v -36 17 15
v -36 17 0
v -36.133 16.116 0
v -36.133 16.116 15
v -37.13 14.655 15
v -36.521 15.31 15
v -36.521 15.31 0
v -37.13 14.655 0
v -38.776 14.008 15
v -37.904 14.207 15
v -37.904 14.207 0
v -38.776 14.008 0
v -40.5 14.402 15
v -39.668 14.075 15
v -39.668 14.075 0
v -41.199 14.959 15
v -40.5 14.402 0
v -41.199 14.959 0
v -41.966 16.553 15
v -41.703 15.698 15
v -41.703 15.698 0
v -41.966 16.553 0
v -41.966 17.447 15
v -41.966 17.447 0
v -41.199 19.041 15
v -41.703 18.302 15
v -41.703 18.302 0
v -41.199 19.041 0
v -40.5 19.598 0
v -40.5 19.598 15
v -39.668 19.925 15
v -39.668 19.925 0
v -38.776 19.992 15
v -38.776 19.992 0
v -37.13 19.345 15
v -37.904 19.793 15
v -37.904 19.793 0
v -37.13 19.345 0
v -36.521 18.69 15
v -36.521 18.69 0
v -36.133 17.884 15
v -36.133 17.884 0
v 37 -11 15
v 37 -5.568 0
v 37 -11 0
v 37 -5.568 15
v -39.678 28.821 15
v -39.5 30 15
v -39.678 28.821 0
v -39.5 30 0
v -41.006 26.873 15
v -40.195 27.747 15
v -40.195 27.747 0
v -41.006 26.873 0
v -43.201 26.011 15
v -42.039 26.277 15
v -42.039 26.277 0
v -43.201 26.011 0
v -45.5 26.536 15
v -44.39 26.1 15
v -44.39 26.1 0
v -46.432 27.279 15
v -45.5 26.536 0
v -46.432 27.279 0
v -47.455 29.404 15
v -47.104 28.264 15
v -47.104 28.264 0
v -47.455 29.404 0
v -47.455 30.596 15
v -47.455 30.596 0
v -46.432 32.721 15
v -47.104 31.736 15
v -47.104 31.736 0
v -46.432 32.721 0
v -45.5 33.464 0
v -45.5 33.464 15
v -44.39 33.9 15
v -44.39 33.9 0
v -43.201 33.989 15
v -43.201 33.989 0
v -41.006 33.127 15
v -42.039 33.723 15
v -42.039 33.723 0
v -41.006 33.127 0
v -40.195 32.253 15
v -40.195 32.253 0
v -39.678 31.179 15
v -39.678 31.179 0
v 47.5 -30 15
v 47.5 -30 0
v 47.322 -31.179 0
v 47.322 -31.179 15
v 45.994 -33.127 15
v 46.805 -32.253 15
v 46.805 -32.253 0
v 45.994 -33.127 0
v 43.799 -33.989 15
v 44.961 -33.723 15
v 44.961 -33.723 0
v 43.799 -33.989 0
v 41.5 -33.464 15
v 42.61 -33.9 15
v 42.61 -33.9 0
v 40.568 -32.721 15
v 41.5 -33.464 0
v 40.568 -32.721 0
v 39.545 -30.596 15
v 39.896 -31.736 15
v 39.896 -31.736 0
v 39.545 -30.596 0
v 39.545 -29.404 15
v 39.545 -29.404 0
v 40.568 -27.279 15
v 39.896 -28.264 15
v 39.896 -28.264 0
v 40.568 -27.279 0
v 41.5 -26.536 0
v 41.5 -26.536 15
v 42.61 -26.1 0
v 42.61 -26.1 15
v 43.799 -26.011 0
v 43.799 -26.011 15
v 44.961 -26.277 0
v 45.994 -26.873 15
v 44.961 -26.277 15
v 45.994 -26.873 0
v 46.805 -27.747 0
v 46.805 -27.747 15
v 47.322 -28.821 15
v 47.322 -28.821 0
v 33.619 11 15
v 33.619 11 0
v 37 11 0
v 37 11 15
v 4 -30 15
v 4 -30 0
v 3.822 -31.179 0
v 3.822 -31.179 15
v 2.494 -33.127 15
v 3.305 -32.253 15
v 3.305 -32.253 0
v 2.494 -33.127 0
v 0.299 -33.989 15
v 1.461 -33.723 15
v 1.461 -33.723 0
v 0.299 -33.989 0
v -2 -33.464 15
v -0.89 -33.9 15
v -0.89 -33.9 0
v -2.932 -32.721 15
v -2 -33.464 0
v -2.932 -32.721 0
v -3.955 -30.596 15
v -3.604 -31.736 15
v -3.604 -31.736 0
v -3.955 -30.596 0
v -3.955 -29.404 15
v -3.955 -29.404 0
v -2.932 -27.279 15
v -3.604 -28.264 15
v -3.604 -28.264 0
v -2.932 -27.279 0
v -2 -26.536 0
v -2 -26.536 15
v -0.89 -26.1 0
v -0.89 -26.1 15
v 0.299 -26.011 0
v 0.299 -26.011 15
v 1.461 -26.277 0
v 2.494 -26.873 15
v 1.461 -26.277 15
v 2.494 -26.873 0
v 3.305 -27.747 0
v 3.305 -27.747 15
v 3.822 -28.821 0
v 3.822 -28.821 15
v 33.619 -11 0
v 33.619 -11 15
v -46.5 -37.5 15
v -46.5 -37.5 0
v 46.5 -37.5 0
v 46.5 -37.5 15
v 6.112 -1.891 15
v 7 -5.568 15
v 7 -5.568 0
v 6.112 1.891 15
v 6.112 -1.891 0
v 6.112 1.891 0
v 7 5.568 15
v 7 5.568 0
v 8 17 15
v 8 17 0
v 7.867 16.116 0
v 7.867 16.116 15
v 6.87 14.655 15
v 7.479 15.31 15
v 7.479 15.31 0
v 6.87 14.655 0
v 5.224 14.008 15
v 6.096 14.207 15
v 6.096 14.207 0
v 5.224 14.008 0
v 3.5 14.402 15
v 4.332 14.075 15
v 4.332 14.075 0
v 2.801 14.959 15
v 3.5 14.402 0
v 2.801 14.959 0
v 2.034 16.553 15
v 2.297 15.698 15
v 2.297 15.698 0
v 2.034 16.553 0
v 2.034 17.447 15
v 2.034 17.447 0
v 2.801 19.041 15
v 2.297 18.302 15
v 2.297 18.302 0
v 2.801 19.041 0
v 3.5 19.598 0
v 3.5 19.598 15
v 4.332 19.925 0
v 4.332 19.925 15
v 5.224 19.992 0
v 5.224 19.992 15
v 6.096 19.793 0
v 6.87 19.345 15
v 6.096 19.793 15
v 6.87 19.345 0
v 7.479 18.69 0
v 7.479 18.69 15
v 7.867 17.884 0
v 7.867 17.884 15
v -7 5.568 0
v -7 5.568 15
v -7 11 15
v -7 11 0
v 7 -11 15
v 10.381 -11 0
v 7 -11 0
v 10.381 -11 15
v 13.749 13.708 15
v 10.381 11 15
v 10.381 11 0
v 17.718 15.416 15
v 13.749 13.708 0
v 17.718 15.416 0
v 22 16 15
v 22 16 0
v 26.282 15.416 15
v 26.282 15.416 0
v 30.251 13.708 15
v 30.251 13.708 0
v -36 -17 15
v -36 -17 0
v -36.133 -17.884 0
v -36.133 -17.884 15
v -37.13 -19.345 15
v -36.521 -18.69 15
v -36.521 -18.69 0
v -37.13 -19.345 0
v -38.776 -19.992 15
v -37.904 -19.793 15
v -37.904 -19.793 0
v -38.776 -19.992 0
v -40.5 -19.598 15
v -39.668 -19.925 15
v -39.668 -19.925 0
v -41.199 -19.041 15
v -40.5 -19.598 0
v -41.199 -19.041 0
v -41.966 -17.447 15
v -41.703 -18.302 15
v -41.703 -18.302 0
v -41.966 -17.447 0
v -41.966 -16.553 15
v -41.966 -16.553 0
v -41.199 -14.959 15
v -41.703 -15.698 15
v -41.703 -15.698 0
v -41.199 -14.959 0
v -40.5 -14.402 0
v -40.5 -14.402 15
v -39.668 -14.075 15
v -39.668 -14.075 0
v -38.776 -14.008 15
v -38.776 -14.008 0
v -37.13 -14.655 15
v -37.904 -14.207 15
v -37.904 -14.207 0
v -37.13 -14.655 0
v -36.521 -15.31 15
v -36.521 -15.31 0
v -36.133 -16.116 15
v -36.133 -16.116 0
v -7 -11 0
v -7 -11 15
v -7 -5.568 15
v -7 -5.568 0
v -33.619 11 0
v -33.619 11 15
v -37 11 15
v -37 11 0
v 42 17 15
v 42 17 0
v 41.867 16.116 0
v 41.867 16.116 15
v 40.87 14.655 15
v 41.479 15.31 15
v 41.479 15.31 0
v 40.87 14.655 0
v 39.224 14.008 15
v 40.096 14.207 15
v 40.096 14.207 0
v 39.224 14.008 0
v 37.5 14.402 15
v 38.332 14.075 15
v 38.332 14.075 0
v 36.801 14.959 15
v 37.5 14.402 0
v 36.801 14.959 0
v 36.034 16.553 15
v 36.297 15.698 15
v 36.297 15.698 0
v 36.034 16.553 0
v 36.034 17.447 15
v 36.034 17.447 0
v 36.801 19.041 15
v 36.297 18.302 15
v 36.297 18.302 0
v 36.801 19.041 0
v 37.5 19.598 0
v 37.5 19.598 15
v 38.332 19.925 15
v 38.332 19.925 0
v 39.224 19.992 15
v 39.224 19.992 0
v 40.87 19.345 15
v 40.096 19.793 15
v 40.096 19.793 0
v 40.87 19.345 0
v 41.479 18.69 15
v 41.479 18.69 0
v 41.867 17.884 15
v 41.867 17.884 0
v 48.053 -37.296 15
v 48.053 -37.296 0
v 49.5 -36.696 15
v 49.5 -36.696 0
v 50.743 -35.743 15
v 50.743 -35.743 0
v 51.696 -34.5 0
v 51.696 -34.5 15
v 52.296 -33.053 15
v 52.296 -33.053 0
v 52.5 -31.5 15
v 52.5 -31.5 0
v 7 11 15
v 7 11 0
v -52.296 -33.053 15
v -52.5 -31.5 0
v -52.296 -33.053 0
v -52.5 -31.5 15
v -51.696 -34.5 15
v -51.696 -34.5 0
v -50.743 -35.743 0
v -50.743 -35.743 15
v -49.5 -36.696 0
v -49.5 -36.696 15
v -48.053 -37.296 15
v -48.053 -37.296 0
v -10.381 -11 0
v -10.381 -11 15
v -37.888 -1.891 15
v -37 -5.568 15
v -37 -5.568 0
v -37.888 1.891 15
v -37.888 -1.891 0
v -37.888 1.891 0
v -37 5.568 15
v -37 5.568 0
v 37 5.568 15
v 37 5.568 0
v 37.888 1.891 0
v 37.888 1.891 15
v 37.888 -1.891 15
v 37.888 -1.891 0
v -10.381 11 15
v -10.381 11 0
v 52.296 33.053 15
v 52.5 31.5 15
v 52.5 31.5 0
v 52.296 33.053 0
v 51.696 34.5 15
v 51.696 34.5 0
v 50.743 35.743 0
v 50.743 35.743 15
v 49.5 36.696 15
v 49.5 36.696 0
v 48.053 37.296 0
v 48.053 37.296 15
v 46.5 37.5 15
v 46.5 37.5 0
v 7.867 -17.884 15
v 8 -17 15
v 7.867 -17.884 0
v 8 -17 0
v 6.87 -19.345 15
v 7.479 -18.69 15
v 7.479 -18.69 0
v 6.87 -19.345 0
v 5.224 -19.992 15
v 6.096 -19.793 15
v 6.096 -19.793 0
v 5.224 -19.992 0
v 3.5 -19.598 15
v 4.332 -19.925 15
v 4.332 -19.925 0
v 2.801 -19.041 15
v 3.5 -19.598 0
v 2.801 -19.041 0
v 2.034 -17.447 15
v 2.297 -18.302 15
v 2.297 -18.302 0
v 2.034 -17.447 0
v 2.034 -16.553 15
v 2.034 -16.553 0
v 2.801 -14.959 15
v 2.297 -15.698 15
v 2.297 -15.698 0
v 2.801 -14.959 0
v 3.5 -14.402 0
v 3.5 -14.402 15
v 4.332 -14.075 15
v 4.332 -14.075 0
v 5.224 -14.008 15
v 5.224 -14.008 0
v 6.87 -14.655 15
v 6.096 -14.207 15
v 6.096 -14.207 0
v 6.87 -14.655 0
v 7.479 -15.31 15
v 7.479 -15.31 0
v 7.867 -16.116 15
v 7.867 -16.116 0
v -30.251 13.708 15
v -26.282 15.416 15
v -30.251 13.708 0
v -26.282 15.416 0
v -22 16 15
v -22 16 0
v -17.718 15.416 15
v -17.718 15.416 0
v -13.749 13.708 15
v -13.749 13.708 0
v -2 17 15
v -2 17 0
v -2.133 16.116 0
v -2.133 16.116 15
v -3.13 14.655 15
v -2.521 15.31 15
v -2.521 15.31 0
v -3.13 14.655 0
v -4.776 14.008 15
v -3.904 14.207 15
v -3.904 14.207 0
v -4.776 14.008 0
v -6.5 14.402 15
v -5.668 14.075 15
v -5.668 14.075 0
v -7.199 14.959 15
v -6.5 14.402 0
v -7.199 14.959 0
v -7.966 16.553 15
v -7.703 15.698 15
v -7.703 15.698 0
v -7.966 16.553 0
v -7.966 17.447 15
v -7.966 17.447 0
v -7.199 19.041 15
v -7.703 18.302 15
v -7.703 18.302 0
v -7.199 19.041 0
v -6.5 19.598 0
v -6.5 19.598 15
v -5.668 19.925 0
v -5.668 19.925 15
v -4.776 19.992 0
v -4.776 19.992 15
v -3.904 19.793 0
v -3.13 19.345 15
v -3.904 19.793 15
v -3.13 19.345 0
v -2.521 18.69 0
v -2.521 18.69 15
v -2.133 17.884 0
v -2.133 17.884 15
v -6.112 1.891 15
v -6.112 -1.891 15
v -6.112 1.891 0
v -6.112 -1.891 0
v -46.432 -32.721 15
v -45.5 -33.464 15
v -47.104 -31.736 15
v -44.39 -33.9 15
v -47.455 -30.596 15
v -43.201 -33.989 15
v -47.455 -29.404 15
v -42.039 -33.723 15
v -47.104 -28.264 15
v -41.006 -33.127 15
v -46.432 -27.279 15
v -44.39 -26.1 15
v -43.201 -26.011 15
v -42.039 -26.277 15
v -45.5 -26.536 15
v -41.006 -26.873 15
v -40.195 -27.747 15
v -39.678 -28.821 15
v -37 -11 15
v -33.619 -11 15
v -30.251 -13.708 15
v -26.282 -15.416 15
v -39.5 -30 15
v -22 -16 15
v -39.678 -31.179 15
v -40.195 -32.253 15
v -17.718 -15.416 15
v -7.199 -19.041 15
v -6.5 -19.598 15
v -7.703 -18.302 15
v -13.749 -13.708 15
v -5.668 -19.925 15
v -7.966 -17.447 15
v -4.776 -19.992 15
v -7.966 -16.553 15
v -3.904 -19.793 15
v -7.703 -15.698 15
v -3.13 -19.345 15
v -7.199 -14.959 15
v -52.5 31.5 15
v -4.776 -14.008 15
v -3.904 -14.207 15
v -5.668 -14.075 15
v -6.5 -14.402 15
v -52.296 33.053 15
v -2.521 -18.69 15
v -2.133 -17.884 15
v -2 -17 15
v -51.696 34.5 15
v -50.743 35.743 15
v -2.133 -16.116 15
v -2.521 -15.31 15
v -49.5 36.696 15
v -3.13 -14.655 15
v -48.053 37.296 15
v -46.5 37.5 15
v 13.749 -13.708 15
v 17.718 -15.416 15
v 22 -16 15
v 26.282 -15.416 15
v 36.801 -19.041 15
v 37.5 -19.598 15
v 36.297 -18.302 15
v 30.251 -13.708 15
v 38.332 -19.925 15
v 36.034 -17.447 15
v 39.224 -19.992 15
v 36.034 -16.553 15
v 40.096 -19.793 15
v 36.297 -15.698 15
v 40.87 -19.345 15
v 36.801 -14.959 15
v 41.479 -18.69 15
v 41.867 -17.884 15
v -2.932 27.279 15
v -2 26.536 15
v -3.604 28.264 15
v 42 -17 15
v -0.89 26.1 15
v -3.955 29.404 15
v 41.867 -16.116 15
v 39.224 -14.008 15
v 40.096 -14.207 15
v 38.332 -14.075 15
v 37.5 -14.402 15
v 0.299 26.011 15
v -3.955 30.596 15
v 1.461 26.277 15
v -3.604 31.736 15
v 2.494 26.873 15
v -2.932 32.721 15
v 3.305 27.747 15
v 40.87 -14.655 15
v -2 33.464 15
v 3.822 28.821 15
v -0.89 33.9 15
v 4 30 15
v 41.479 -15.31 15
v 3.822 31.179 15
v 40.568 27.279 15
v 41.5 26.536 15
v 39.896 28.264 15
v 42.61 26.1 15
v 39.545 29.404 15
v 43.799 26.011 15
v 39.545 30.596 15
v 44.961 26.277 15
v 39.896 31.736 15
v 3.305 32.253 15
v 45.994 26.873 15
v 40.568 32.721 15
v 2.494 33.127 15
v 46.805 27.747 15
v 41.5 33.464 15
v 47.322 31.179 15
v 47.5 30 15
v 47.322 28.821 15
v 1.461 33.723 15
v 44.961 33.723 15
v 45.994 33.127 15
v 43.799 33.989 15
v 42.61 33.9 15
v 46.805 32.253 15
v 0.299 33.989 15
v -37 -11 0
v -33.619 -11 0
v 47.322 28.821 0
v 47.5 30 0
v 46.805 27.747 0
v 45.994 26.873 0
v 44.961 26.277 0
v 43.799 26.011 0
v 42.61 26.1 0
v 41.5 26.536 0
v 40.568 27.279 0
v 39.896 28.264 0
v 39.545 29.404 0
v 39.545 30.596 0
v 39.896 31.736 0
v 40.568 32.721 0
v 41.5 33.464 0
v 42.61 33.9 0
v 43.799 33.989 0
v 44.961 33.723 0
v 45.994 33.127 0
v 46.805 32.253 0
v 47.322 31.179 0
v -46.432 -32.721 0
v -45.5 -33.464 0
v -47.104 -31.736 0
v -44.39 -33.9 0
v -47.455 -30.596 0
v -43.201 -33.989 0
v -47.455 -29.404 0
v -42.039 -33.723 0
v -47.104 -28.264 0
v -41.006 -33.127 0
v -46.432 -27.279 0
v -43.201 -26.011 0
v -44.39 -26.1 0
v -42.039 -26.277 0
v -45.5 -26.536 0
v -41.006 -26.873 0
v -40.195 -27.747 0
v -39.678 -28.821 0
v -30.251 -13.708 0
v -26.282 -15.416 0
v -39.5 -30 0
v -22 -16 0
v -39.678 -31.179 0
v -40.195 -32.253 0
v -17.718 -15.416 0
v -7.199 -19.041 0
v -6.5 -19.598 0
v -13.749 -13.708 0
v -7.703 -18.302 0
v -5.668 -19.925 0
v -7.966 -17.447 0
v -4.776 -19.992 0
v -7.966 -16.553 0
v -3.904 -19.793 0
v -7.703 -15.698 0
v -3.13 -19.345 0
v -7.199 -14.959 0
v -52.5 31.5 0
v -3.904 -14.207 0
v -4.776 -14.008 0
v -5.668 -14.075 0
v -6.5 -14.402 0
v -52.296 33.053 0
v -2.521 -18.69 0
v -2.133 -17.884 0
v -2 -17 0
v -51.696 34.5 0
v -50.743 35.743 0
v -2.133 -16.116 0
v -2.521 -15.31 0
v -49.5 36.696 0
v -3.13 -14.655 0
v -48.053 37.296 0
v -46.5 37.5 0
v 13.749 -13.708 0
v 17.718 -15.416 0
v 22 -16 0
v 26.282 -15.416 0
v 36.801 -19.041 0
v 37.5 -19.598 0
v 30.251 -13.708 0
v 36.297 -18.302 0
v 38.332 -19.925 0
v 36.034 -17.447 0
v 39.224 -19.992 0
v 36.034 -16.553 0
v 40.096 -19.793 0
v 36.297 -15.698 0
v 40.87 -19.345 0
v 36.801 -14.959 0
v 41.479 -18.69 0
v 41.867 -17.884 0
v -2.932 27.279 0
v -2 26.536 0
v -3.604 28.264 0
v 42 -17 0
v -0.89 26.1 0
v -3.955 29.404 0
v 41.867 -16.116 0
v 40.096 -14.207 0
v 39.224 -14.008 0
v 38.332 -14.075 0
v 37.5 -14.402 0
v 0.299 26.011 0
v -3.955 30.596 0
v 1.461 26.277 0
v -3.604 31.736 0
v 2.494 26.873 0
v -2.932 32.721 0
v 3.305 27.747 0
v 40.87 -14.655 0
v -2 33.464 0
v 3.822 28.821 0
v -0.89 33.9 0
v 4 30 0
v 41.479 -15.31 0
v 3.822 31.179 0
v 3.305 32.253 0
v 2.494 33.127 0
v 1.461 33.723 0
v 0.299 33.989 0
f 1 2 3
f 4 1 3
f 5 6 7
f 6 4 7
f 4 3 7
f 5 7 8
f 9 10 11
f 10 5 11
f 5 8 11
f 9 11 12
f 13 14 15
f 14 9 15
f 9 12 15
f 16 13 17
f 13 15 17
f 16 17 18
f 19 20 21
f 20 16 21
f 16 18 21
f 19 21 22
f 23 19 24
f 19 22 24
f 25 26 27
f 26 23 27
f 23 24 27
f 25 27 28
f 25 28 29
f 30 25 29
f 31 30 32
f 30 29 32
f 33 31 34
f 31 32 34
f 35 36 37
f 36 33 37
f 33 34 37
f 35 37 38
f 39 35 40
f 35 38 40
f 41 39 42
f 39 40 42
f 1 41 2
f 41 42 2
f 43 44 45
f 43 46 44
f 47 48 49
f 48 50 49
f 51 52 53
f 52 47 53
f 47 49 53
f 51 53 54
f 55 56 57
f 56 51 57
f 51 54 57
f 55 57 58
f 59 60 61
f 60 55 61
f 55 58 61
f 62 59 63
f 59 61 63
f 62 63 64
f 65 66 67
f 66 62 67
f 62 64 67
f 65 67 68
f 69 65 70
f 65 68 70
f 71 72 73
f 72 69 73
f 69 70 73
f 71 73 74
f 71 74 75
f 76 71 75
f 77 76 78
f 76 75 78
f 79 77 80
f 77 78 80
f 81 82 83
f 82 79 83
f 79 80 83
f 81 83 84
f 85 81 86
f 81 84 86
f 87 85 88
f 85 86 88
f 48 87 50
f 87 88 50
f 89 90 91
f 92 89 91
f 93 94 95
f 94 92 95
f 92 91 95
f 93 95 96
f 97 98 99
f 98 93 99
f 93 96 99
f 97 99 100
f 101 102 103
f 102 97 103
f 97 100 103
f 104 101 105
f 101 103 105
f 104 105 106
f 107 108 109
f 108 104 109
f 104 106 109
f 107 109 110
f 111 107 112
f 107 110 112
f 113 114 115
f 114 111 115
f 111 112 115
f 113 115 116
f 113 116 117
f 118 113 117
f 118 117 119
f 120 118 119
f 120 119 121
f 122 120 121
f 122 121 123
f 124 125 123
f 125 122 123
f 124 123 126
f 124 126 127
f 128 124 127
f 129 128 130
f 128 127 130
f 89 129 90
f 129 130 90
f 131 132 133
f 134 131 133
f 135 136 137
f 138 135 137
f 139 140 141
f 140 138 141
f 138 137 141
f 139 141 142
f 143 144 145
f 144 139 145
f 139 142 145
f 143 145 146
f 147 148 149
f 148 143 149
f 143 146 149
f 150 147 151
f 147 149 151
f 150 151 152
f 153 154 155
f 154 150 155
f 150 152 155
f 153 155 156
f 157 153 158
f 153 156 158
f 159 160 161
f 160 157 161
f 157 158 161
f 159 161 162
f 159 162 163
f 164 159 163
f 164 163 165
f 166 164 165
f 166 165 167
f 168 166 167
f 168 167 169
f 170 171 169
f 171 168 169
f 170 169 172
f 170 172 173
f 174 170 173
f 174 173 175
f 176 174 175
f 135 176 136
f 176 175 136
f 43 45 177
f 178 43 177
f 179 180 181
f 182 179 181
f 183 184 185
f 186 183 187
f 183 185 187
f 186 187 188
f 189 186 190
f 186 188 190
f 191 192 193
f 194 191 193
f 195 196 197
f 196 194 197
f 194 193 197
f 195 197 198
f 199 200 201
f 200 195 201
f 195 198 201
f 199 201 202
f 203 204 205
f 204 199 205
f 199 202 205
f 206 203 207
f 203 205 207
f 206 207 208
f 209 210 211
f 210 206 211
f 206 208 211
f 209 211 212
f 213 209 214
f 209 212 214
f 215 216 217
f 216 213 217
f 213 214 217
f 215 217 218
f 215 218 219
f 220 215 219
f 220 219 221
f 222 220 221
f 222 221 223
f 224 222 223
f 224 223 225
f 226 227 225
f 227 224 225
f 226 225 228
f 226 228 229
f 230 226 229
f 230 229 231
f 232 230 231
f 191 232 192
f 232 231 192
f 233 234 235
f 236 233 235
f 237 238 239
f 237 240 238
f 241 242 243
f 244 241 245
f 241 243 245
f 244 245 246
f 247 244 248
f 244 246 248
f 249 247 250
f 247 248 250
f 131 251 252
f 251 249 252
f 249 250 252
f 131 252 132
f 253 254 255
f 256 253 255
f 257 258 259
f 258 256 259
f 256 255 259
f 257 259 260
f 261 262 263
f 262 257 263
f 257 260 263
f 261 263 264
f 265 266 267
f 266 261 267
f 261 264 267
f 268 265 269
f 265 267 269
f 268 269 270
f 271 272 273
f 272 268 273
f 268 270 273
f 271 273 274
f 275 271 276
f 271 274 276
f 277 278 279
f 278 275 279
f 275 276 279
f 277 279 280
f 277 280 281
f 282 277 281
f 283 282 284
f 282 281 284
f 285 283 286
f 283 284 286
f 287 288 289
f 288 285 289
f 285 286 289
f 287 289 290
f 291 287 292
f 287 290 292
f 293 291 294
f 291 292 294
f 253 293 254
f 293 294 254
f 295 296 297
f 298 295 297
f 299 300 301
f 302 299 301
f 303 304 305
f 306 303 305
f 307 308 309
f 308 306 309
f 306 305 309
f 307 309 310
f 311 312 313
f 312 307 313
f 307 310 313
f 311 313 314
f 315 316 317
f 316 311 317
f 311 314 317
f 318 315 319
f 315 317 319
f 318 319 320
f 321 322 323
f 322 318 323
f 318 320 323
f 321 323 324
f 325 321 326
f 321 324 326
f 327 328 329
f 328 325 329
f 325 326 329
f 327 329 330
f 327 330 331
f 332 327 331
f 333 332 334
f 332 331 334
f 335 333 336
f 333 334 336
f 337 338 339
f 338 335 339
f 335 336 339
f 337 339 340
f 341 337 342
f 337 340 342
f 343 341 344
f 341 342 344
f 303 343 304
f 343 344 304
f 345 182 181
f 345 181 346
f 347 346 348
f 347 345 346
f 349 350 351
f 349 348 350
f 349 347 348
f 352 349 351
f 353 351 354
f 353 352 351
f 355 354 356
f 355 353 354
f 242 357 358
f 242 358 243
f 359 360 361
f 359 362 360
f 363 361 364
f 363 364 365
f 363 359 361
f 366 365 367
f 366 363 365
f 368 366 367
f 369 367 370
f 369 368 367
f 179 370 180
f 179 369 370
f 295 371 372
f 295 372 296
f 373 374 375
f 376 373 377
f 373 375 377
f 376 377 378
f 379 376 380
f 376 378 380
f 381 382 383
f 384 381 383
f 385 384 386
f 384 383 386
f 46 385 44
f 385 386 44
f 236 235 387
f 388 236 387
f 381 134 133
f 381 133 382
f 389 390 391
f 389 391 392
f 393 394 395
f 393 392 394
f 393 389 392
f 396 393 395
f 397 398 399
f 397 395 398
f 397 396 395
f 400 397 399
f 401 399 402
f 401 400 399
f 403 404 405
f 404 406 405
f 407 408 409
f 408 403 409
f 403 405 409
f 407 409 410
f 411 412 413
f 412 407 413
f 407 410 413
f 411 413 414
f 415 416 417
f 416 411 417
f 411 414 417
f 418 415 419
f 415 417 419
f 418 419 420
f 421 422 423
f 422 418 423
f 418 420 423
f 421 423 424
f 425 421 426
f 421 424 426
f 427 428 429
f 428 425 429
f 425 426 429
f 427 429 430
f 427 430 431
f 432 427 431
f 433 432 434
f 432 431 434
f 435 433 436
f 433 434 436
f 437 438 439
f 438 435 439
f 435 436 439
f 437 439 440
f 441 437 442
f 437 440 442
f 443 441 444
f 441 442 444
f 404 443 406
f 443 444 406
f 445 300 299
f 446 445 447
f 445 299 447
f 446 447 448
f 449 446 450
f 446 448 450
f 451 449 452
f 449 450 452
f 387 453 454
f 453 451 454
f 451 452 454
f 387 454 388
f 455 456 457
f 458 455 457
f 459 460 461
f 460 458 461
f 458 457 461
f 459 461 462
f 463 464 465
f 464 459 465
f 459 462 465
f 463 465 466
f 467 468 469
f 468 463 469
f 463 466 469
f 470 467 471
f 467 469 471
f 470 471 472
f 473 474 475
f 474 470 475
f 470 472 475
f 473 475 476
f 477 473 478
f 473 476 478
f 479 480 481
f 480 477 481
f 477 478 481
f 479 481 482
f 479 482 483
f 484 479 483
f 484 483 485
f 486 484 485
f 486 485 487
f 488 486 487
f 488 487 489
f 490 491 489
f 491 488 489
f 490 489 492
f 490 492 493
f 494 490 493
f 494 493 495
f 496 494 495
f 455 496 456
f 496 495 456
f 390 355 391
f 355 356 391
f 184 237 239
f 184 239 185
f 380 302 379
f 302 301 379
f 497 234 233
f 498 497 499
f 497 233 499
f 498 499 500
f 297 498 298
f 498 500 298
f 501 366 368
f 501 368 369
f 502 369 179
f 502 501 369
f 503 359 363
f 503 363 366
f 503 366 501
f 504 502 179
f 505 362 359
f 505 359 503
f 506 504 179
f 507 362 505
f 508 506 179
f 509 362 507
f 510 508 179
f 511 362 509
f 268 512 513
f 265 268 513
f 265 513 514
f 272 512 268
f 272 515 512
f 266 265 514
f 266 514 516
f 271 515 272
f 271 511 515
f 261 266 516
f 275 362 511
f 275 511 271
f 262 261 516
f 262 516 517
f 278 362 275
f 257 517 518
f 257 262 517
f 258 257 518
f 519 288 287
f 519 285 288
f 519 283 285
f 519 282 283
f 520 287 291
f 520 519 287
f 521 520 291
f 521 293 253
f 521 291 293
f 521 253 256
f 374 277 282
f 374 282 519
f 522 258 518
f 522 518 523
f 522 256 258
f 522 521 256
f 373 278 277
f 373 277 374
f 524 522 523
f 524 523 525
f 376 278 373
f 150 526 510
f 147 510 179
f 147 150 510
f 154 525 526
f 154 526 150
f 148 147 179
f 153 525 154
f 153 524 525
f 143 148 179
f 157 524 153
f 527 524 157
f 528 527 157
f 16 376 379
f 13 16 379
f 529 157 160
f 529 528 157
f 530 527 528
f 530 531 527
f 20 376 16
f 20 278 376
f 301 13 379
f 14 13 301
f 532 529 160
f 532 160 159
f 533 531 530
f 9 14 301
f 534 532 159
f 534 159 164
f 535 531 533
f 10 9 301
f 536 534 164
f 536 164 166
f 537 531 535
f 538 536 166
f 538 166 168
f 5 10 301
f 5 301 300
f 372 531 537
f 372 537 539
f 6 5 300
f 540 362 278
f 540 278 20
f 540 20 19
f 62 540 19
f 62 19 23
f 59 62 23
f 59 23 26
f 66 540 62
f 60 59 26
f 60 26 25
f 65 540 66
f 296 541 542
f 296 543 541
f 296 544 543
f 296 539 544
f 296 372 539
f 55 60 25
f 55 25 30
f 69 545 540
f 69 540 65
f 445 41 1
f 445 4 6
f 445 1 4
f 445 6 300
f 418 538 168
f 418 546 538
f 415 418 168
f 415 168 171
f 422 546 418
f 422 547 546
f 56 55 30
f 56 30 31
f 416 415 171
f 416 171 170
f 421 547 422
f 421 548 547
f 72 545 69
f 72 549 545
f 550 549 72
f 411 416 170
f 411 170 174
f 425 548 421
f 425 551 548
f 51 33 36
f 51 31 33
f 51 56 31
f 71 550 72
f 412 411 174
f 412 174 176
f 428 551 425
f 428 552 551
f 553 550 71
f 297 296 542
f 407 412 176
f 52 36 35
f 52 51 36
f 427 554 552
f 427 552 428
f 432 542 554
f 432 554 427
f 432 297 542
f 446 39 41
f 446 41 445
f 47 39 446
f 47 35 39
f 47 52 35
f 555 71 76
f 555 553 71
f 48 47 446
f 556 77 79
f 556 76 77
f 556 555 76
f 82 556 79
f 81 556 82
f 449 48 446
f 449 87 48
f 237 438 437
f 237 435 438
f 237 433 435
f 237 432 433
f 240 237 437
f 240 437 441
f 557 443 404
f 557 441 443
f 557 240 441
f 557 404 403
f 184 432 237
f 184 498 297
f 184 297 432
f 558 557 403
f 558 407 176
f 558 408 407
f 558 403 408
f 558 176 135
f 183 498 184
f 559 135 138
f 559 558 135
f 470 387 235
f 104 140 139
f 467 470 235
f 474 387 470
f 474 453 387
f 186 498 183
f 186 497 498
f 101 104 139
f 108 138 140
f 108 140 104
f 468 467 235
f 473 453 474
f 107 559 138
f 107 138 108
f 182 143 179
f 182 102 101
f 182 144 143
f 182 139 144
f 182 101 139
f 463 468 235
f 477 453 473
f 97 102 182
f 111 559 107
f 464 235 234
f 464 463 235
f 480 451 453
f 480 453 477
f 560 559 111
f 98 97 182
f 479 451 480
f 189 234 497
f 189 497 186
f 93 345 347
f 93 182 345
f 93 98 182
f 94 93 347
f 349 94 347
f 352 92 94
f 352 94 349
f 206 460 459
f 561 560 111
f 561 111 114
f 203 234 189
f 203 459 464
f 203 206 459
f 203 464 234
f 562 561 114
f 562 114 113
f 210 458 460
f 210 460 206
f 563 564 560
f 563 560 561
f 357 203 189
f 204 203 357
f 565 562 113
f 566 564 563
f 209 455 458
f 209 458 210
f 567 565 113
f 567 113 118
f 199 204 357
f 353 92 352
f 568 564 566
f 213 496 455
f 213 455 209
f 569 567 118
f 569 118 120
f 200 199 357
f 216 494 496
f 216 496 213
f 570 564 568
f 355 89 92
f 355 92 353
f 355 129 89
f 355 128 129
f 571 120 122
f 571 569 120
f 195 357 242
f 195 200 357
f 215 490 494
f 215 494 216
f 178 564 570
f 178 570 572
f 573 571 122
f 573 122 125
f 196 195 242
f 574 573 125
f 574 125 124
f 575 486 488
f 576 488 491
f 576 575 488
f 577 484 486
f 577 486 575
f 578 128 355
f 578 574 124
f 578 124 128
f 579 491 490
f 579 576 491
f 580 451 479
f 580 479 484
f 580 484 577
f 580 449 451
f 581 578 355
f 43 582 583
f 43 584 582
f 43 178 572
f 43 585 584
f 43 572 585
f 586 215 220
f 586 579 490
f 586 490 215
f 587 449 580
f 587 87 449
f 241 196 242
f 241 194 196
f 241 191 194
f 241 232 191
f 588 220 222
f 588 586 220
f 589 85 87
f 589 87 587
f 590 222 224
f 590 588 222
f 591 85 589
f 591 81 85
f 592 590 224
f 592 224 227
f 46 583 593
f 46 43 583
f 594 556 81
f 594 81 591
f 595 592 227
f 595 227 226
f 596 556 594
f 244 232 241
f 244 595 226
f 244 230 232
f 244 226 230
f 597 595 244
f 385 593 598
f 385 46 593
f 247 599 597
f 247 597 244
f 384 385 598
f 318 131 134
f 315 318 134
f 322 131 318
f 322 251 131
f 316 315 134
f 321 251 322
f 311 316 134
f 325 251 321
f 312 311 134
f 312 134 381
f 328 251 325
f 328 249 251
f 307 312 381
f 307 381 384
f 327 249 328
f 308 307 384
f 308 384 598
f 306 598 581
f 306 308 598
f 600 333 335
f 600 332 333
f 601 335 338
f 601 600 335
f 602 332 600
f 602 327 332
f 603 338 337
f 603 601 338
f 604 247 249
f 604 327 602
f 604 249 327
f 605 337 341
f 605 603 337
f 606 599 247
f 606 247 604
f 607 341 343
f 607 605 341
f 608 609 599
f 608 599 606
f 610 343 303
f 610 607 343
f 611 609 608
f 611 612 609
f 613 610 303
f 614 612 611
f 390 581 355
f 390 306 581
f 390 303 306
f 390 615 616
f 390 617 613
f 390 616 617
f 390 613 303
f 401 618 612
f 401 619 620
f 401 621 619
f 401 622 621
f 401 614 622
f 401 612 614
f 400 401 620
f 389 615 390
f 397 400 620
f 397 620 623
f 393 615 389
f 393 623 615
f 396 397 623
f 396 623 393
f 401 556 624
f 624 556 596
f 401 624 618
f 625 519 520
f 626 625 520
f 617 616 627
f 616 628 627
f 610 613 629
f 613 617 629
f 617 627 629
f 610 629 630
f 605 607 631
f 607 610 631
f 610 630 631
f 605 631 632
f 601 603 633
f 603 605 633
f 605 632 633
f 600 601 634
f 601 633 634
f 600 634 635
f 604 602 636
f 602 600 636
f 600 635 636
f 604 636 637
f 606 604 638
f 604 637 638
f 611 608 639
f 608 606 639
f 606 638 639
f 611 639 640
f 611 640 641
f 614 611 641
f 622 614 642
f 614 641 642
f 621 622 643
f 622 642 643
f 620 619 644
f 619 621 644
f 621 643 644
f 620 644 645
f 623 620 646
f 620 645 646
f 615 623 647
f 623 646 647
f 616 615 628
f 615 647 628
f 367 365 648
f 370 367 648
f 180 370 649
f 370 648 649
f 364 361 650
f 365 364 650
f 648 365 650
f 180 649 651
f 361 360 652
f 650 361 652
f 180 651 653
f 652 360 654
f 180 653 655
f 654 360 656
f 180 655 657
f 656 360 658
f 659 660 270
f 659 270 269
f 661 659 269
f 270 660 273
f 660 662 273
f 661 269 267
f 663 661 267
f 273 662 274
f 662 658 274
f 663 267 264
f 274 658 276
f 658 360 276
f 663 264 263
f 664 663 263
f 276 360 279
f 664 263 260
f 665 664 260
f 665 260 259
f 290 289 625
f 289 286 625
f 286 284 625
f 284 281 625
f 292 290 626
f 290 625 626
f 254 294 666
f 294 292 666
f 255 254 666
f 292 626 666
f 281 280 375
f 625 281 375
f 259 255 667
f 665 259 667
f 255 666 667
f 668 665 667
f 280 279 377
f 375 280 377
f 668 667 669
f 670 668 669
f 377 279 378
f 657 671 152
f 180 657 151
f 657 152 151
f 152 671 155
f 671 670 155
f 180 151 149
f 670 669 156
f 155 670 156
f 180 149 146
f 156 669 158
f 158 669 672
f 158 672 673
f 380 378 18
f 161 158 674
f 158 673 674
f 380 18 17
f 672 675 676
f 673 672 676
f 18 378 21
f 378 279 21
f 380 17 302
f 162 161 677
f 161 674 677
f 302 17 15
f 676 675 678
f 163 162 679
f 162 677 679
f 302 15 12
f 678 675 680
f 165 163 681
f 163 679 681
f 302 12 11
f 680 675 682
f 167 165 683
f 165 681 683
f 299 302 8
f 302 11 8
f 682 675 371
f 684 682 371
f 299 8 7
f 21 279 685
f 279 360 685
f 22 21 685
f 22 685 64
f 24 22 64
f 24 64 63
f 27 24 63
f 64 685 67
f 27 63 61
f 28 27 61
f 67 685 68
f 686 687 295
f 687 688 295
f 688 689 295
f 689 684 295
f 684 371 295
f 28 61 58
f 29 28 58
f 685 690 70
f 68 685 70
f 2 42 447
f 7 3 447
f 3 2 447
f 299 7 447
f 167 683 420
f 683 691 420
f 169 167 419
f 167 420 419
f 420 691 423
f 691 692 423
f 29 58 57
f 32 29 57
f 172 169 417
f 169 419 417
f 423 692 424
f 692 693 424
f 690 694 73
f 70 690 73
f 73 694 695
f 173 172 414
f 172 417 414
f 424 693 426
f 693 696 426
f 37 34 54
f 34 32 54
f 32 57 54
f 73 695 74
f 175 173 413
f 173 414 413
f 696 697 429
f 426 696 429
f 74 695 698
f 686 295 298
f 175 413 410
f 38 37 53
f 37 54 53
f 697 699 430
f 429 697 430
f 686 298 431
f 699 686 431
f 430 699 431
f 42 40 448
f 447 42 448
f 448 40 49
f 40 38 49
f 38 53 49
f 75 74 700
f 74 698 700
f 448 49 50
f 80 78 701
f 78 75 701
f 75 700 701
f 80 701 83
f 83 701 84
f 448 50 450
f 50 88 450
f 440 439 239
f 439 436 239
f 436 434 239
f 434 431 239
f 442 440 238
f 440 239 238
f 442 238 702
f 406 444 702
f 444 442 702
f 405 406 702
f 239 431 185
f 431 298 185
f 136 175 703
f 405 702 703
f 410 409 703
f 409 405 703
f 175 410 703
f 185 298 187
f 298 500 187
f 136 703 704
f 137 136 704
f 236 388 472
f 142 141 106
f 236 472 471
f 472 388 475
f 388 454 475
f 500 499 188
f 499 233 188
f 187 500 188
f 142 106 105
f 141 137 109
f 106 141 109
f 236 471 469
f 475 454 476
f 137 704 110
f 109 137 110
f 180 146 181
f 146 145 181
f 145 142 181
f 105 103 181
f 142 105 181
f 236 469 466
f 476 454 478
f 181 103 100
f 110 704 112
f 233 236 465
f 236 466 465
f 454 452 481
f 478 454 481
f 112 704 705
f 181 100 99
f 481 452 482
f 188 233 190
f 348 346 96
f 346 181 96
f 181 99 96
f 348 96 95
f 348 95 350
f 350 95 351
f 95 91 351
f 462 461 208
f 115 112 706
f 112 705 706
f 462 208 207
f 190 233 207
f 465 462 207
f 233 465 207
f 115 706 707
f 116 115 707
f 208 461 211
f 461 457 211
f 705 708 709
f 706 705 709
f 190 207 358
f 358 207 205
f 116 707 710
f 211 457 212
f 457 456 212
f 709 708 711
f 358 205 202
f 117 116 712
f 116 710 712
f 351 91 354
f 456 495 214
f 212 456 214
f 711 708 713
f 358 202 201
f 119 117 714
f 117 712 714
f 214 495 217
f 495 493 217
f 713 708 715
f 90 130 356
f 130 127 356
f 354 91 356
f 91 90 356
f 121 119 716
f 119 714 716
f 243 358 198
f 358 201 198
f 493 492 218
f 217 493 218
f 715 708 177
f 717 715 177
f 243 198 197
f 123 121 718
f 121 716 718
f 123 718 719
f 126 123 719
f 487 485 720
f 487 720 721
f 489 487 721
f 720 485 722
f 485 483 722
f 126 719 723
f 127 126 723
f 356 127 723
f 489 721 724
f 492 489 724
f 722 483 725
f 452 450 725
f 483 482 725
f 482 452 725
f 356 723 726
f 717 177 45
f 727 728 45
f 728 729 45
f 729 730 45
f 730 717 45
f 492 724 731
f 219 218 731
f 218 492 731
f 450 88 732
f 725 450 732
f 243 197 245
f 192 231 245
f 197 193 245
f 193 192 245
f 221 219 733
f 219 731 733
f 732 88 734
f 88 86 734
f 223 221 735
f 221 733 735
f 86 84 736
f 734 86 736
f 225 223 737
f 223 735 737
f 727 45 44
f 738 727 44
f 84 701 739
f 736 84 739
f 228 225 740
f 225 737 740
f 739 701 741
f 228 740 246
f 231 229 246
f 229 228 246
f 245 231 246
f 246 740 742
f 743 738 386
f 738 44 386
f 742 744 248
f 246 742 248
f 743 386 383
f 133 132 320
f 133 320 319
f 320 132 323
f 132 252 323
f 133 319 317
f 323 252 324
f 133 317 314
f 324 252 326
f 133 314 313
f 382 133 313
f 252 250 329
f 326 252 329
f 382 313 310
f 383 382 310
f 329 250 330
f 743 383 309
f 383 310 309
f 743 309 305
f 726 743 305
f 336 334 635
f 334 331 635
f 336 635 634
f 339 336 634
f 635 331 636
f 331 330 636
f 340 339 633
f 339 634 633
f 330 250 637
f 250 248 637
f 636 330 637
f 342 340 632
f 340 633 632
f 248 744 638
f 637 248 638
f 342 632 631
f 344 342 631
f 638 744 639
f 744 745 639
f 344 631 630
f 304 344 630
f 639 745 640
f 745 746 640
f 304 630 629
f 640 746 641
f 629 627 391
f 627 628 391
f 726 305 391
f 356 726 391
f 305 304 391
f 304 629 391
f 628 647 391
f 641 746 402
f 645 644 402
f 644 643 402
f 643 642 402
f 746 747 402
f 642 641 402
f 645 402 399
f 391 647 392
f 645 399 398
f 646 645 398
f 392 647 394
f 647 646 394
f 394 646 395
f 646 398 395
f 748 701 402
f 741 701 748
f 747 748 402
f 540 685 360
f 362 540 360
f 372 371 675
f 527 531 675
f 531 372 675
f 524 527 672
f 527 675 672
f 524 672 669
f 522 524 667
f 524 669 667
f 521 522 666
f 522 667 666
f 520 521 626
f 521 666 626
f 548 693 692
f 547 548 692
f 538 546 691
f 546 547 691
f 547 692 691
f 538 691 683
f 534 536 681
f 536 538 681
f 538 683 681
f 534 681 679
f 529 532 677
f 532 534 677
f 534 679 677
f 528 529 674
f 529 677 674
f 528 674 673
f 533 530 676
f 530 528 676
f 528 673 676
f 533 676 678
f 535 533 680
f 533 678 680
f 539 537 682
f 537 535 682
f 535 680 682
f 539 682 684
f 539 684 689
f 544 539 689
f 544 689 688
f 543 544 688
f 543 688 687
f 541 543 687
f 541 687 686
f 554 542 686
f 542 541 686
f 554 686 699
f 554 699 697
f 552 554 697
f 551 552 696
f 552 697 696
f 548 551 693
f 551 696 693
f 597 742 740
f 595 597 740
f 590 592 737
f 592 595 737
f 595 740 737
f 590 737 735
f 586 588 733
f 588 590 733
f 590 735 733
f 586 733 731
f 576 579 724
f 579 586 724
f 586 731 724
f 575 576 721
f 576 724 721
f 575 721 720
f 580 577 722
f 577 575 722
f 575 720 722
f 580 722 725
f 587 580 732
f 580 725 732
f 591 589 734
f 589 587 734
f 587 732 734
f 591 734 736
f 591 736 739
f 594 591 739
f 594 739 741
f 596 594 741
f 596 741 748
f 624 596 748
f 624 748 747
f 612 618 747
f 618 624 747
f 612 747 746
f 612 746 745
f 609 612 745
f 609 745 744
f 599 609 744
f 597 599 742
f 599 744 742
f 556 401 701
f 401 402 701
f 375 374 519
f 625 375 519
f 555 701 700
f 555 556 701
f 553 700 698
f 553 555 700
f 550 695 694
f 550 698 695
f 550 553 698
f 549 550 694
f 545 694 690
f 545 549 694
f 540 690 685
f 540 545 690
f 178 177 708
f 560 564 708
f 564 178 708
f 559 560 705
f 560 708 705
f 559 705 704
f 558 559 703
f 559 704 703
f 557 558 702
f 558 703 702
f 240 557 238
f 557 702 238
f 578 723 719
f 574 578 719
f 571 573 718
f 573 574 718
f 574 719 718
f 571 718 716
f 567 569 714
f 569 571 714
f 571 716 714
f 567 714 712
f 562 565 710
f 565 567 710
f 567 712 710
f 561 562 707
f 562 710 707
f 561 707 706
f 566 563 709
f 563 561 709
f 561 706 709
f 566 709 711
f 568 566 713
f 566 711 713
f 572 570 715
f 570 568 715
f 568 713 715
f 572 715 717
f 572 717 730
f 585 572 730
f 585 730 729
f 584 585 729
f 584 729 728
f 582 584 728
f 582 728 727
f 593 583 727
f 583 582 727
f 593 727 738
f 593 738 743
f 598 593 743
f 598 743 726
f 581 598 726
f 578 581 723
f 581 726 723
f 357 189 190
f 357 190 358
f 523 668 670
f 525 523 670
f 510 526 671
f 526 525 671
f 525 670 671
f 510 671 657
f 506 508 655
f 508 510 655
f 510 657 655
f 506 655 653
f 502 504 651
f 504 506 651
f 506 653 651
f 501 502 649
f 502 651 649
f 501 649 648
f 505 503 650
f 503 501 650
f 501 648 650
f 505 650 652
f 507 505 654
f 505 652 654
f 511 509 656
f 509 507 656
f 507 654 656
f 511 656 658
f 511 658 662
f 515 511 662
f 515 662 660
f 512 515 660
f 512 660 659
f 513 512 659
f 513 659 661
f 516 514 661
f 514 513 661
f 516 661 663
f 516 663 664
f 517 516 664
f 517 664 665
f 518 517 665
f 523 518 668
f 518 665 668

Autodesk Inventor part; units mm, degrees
ref_plane "YZ Plane" through (0, 0, 0) normal (1, 0, 0) x (0, 1, 0)
ref_plane "XZ Plane" through (0, 0, 0) normal (0, 1, 0) x (-1, 0, 0)
ref_plane "XY Plane" through (0, 0, 0) normal (0, 0, 1) x (1, 0, 0)
sketch "Sketch1" plane through (0, 0, 0) normal (0, 0, 1) x (1, 0, 0)
  line L0 (-22, 0) -> (22, 0) construction
  circle A0 centre (-22, 0) radius 16
  circle A1 centre (22, 0) radius 16
  line L1 (43.5, -30) -> (-43.5, -30) construction
  line L2 (-43.5, -30) -> (-43.5, 30) construction
  line L3 (-43.5, 30) -> (43.5, 30) construction
  line L4 (43.5, 30) -> (43.5, -30) construction
  line L5 (43.5, -30) -> (-43.5, 30) construction
  line L6 (-43.5, -30) -> (43.5, 30) construction
  circle A2 centre (-43.5, 30) radius 4
  circle A3 centre (0, 30) radius 4
  circle A4 centre (43.5, 30) radius 4
  circle A5 centre (43.5, -30) radius 4
  circle A6 centre (-43.5, -30) radius 4
  circle A7 centre (0, -30) radius 4
  line L7 (-52.5, -37.5) -> (52.5, -37.5)
  line L8 (52.5, -37.5) -> (52.5, 37.5)
  line L9 (52.5, 37.5) -> (-52.5, 37.5)
  line L10 (-52.5, 37.5) -> (-52.5, -37.5)
  line L11 (-52.5, -37.5) -> (52.5, 37.5) construction
  line L12 (52.5, -37.5) -> (-52.5, 37.5) construction
  line L13 (-5, -17) -> (-39, -17) construction
  line L14 (-39, -17) -> (-39, 17) construction
  line L15 (-39, 17) -> (-5, 17) construction
  line L16 (-5, 17) -> (-5, -17) construction
  line L17 (-5, -17) -> (-39, 17) construction
  line L18 (-39, -17) -> (-5, 17) construction
  line L19 (39, -17) -> (5, -17) construction
  line L20 (5, -17) -> (5, 17) construction
  line L21 (5, 17) -> (39, 17) construction
  line L22 (39, 17) -> (39, -17) construction
  line L23 (39, -17) -> (5, 17) construction
  line L24 (5, -17) -> (39, 17) construction
  circle A8 centre (-39, 17) radius 3
  circle A9 centre (-39, -17) radius 3
  circle A10 centre (-5, -17) radius 3
  circle A11 centre (-5, 17) radius 3
  circle A12 centre (5, 17) radius 3
  circle A13 centre (5, -17) radius 3
  circle A14 centre (39, -17) radius 3
  circle A15 centre (39, 17) radius 3
  point P0 (0, 0)
  point P1 (0, 0)
  dimension "d0" = 60
  dimension "d1" = 87
  dimension "d2" = 44
  dimension "d3" = 32
  dimension "d4" = 8
  dimension "d5" = 105
  dimension "d6" = 75
  dimension "d10" = 34
  dimension "d11" = 6
extrude "Extrusion1" add sketch "Sketch1" along normal blind 15
fillet "Fillet1" radius 6 4 edges at (-52.5, 37.5, 7.5) (52.5, 37.5, 7.5) (52.5, -37.5, 7.5) (-52.5, -37.5, 7.5)
sketch "Sketch2" plane through (0, 0, 15) normal (0, 0, 1) x (1, 0, 0)
  circle A0 centre (22, 0) radius 16 projected
  circle A1 centre (-22, 0) radius 16 projected
  line L0 (37, -11) -> (7, -11)
  line L1 (7, -11) -> (7, 11)
  line L2 (7, 11) -> (37, 11)
  line L3 (37, 11) -> (37, -11)
  line L4 (37, -11) -> (7, 11) construction
  line L5 (7, -11) -> (37, 11) construction
  line L6 (-37, -11) -> (-7, -11)
  line L7 (-7, -11) -> (-7, 11)
  line L8 (-7, 11) -> (-37, 11)
  line L9 (-37, 11) -> (-37, -11)
  line L10 (-37, -11) -> (-7, 11) construction
  line L11 (-7, -11) -> (-37, 11) construction
  point P0 (0, 0)
  dimension "d12" = 22
  dimension "d13" = 30
extrude "Extrusion2" cut sketch "Sketch2" against normal through all contours L3 A0 L0 L1 L2 | A0 L2 L3 | L3 L0 A0 | A0 L1 L2 | L0 L1 A0 | L7 A1 L6 L9 L8 | A1 L8 L7 | L7 L6 A1 | A1 L9 L8 | L6 L9 A1
properties part number "cylinder frame"
